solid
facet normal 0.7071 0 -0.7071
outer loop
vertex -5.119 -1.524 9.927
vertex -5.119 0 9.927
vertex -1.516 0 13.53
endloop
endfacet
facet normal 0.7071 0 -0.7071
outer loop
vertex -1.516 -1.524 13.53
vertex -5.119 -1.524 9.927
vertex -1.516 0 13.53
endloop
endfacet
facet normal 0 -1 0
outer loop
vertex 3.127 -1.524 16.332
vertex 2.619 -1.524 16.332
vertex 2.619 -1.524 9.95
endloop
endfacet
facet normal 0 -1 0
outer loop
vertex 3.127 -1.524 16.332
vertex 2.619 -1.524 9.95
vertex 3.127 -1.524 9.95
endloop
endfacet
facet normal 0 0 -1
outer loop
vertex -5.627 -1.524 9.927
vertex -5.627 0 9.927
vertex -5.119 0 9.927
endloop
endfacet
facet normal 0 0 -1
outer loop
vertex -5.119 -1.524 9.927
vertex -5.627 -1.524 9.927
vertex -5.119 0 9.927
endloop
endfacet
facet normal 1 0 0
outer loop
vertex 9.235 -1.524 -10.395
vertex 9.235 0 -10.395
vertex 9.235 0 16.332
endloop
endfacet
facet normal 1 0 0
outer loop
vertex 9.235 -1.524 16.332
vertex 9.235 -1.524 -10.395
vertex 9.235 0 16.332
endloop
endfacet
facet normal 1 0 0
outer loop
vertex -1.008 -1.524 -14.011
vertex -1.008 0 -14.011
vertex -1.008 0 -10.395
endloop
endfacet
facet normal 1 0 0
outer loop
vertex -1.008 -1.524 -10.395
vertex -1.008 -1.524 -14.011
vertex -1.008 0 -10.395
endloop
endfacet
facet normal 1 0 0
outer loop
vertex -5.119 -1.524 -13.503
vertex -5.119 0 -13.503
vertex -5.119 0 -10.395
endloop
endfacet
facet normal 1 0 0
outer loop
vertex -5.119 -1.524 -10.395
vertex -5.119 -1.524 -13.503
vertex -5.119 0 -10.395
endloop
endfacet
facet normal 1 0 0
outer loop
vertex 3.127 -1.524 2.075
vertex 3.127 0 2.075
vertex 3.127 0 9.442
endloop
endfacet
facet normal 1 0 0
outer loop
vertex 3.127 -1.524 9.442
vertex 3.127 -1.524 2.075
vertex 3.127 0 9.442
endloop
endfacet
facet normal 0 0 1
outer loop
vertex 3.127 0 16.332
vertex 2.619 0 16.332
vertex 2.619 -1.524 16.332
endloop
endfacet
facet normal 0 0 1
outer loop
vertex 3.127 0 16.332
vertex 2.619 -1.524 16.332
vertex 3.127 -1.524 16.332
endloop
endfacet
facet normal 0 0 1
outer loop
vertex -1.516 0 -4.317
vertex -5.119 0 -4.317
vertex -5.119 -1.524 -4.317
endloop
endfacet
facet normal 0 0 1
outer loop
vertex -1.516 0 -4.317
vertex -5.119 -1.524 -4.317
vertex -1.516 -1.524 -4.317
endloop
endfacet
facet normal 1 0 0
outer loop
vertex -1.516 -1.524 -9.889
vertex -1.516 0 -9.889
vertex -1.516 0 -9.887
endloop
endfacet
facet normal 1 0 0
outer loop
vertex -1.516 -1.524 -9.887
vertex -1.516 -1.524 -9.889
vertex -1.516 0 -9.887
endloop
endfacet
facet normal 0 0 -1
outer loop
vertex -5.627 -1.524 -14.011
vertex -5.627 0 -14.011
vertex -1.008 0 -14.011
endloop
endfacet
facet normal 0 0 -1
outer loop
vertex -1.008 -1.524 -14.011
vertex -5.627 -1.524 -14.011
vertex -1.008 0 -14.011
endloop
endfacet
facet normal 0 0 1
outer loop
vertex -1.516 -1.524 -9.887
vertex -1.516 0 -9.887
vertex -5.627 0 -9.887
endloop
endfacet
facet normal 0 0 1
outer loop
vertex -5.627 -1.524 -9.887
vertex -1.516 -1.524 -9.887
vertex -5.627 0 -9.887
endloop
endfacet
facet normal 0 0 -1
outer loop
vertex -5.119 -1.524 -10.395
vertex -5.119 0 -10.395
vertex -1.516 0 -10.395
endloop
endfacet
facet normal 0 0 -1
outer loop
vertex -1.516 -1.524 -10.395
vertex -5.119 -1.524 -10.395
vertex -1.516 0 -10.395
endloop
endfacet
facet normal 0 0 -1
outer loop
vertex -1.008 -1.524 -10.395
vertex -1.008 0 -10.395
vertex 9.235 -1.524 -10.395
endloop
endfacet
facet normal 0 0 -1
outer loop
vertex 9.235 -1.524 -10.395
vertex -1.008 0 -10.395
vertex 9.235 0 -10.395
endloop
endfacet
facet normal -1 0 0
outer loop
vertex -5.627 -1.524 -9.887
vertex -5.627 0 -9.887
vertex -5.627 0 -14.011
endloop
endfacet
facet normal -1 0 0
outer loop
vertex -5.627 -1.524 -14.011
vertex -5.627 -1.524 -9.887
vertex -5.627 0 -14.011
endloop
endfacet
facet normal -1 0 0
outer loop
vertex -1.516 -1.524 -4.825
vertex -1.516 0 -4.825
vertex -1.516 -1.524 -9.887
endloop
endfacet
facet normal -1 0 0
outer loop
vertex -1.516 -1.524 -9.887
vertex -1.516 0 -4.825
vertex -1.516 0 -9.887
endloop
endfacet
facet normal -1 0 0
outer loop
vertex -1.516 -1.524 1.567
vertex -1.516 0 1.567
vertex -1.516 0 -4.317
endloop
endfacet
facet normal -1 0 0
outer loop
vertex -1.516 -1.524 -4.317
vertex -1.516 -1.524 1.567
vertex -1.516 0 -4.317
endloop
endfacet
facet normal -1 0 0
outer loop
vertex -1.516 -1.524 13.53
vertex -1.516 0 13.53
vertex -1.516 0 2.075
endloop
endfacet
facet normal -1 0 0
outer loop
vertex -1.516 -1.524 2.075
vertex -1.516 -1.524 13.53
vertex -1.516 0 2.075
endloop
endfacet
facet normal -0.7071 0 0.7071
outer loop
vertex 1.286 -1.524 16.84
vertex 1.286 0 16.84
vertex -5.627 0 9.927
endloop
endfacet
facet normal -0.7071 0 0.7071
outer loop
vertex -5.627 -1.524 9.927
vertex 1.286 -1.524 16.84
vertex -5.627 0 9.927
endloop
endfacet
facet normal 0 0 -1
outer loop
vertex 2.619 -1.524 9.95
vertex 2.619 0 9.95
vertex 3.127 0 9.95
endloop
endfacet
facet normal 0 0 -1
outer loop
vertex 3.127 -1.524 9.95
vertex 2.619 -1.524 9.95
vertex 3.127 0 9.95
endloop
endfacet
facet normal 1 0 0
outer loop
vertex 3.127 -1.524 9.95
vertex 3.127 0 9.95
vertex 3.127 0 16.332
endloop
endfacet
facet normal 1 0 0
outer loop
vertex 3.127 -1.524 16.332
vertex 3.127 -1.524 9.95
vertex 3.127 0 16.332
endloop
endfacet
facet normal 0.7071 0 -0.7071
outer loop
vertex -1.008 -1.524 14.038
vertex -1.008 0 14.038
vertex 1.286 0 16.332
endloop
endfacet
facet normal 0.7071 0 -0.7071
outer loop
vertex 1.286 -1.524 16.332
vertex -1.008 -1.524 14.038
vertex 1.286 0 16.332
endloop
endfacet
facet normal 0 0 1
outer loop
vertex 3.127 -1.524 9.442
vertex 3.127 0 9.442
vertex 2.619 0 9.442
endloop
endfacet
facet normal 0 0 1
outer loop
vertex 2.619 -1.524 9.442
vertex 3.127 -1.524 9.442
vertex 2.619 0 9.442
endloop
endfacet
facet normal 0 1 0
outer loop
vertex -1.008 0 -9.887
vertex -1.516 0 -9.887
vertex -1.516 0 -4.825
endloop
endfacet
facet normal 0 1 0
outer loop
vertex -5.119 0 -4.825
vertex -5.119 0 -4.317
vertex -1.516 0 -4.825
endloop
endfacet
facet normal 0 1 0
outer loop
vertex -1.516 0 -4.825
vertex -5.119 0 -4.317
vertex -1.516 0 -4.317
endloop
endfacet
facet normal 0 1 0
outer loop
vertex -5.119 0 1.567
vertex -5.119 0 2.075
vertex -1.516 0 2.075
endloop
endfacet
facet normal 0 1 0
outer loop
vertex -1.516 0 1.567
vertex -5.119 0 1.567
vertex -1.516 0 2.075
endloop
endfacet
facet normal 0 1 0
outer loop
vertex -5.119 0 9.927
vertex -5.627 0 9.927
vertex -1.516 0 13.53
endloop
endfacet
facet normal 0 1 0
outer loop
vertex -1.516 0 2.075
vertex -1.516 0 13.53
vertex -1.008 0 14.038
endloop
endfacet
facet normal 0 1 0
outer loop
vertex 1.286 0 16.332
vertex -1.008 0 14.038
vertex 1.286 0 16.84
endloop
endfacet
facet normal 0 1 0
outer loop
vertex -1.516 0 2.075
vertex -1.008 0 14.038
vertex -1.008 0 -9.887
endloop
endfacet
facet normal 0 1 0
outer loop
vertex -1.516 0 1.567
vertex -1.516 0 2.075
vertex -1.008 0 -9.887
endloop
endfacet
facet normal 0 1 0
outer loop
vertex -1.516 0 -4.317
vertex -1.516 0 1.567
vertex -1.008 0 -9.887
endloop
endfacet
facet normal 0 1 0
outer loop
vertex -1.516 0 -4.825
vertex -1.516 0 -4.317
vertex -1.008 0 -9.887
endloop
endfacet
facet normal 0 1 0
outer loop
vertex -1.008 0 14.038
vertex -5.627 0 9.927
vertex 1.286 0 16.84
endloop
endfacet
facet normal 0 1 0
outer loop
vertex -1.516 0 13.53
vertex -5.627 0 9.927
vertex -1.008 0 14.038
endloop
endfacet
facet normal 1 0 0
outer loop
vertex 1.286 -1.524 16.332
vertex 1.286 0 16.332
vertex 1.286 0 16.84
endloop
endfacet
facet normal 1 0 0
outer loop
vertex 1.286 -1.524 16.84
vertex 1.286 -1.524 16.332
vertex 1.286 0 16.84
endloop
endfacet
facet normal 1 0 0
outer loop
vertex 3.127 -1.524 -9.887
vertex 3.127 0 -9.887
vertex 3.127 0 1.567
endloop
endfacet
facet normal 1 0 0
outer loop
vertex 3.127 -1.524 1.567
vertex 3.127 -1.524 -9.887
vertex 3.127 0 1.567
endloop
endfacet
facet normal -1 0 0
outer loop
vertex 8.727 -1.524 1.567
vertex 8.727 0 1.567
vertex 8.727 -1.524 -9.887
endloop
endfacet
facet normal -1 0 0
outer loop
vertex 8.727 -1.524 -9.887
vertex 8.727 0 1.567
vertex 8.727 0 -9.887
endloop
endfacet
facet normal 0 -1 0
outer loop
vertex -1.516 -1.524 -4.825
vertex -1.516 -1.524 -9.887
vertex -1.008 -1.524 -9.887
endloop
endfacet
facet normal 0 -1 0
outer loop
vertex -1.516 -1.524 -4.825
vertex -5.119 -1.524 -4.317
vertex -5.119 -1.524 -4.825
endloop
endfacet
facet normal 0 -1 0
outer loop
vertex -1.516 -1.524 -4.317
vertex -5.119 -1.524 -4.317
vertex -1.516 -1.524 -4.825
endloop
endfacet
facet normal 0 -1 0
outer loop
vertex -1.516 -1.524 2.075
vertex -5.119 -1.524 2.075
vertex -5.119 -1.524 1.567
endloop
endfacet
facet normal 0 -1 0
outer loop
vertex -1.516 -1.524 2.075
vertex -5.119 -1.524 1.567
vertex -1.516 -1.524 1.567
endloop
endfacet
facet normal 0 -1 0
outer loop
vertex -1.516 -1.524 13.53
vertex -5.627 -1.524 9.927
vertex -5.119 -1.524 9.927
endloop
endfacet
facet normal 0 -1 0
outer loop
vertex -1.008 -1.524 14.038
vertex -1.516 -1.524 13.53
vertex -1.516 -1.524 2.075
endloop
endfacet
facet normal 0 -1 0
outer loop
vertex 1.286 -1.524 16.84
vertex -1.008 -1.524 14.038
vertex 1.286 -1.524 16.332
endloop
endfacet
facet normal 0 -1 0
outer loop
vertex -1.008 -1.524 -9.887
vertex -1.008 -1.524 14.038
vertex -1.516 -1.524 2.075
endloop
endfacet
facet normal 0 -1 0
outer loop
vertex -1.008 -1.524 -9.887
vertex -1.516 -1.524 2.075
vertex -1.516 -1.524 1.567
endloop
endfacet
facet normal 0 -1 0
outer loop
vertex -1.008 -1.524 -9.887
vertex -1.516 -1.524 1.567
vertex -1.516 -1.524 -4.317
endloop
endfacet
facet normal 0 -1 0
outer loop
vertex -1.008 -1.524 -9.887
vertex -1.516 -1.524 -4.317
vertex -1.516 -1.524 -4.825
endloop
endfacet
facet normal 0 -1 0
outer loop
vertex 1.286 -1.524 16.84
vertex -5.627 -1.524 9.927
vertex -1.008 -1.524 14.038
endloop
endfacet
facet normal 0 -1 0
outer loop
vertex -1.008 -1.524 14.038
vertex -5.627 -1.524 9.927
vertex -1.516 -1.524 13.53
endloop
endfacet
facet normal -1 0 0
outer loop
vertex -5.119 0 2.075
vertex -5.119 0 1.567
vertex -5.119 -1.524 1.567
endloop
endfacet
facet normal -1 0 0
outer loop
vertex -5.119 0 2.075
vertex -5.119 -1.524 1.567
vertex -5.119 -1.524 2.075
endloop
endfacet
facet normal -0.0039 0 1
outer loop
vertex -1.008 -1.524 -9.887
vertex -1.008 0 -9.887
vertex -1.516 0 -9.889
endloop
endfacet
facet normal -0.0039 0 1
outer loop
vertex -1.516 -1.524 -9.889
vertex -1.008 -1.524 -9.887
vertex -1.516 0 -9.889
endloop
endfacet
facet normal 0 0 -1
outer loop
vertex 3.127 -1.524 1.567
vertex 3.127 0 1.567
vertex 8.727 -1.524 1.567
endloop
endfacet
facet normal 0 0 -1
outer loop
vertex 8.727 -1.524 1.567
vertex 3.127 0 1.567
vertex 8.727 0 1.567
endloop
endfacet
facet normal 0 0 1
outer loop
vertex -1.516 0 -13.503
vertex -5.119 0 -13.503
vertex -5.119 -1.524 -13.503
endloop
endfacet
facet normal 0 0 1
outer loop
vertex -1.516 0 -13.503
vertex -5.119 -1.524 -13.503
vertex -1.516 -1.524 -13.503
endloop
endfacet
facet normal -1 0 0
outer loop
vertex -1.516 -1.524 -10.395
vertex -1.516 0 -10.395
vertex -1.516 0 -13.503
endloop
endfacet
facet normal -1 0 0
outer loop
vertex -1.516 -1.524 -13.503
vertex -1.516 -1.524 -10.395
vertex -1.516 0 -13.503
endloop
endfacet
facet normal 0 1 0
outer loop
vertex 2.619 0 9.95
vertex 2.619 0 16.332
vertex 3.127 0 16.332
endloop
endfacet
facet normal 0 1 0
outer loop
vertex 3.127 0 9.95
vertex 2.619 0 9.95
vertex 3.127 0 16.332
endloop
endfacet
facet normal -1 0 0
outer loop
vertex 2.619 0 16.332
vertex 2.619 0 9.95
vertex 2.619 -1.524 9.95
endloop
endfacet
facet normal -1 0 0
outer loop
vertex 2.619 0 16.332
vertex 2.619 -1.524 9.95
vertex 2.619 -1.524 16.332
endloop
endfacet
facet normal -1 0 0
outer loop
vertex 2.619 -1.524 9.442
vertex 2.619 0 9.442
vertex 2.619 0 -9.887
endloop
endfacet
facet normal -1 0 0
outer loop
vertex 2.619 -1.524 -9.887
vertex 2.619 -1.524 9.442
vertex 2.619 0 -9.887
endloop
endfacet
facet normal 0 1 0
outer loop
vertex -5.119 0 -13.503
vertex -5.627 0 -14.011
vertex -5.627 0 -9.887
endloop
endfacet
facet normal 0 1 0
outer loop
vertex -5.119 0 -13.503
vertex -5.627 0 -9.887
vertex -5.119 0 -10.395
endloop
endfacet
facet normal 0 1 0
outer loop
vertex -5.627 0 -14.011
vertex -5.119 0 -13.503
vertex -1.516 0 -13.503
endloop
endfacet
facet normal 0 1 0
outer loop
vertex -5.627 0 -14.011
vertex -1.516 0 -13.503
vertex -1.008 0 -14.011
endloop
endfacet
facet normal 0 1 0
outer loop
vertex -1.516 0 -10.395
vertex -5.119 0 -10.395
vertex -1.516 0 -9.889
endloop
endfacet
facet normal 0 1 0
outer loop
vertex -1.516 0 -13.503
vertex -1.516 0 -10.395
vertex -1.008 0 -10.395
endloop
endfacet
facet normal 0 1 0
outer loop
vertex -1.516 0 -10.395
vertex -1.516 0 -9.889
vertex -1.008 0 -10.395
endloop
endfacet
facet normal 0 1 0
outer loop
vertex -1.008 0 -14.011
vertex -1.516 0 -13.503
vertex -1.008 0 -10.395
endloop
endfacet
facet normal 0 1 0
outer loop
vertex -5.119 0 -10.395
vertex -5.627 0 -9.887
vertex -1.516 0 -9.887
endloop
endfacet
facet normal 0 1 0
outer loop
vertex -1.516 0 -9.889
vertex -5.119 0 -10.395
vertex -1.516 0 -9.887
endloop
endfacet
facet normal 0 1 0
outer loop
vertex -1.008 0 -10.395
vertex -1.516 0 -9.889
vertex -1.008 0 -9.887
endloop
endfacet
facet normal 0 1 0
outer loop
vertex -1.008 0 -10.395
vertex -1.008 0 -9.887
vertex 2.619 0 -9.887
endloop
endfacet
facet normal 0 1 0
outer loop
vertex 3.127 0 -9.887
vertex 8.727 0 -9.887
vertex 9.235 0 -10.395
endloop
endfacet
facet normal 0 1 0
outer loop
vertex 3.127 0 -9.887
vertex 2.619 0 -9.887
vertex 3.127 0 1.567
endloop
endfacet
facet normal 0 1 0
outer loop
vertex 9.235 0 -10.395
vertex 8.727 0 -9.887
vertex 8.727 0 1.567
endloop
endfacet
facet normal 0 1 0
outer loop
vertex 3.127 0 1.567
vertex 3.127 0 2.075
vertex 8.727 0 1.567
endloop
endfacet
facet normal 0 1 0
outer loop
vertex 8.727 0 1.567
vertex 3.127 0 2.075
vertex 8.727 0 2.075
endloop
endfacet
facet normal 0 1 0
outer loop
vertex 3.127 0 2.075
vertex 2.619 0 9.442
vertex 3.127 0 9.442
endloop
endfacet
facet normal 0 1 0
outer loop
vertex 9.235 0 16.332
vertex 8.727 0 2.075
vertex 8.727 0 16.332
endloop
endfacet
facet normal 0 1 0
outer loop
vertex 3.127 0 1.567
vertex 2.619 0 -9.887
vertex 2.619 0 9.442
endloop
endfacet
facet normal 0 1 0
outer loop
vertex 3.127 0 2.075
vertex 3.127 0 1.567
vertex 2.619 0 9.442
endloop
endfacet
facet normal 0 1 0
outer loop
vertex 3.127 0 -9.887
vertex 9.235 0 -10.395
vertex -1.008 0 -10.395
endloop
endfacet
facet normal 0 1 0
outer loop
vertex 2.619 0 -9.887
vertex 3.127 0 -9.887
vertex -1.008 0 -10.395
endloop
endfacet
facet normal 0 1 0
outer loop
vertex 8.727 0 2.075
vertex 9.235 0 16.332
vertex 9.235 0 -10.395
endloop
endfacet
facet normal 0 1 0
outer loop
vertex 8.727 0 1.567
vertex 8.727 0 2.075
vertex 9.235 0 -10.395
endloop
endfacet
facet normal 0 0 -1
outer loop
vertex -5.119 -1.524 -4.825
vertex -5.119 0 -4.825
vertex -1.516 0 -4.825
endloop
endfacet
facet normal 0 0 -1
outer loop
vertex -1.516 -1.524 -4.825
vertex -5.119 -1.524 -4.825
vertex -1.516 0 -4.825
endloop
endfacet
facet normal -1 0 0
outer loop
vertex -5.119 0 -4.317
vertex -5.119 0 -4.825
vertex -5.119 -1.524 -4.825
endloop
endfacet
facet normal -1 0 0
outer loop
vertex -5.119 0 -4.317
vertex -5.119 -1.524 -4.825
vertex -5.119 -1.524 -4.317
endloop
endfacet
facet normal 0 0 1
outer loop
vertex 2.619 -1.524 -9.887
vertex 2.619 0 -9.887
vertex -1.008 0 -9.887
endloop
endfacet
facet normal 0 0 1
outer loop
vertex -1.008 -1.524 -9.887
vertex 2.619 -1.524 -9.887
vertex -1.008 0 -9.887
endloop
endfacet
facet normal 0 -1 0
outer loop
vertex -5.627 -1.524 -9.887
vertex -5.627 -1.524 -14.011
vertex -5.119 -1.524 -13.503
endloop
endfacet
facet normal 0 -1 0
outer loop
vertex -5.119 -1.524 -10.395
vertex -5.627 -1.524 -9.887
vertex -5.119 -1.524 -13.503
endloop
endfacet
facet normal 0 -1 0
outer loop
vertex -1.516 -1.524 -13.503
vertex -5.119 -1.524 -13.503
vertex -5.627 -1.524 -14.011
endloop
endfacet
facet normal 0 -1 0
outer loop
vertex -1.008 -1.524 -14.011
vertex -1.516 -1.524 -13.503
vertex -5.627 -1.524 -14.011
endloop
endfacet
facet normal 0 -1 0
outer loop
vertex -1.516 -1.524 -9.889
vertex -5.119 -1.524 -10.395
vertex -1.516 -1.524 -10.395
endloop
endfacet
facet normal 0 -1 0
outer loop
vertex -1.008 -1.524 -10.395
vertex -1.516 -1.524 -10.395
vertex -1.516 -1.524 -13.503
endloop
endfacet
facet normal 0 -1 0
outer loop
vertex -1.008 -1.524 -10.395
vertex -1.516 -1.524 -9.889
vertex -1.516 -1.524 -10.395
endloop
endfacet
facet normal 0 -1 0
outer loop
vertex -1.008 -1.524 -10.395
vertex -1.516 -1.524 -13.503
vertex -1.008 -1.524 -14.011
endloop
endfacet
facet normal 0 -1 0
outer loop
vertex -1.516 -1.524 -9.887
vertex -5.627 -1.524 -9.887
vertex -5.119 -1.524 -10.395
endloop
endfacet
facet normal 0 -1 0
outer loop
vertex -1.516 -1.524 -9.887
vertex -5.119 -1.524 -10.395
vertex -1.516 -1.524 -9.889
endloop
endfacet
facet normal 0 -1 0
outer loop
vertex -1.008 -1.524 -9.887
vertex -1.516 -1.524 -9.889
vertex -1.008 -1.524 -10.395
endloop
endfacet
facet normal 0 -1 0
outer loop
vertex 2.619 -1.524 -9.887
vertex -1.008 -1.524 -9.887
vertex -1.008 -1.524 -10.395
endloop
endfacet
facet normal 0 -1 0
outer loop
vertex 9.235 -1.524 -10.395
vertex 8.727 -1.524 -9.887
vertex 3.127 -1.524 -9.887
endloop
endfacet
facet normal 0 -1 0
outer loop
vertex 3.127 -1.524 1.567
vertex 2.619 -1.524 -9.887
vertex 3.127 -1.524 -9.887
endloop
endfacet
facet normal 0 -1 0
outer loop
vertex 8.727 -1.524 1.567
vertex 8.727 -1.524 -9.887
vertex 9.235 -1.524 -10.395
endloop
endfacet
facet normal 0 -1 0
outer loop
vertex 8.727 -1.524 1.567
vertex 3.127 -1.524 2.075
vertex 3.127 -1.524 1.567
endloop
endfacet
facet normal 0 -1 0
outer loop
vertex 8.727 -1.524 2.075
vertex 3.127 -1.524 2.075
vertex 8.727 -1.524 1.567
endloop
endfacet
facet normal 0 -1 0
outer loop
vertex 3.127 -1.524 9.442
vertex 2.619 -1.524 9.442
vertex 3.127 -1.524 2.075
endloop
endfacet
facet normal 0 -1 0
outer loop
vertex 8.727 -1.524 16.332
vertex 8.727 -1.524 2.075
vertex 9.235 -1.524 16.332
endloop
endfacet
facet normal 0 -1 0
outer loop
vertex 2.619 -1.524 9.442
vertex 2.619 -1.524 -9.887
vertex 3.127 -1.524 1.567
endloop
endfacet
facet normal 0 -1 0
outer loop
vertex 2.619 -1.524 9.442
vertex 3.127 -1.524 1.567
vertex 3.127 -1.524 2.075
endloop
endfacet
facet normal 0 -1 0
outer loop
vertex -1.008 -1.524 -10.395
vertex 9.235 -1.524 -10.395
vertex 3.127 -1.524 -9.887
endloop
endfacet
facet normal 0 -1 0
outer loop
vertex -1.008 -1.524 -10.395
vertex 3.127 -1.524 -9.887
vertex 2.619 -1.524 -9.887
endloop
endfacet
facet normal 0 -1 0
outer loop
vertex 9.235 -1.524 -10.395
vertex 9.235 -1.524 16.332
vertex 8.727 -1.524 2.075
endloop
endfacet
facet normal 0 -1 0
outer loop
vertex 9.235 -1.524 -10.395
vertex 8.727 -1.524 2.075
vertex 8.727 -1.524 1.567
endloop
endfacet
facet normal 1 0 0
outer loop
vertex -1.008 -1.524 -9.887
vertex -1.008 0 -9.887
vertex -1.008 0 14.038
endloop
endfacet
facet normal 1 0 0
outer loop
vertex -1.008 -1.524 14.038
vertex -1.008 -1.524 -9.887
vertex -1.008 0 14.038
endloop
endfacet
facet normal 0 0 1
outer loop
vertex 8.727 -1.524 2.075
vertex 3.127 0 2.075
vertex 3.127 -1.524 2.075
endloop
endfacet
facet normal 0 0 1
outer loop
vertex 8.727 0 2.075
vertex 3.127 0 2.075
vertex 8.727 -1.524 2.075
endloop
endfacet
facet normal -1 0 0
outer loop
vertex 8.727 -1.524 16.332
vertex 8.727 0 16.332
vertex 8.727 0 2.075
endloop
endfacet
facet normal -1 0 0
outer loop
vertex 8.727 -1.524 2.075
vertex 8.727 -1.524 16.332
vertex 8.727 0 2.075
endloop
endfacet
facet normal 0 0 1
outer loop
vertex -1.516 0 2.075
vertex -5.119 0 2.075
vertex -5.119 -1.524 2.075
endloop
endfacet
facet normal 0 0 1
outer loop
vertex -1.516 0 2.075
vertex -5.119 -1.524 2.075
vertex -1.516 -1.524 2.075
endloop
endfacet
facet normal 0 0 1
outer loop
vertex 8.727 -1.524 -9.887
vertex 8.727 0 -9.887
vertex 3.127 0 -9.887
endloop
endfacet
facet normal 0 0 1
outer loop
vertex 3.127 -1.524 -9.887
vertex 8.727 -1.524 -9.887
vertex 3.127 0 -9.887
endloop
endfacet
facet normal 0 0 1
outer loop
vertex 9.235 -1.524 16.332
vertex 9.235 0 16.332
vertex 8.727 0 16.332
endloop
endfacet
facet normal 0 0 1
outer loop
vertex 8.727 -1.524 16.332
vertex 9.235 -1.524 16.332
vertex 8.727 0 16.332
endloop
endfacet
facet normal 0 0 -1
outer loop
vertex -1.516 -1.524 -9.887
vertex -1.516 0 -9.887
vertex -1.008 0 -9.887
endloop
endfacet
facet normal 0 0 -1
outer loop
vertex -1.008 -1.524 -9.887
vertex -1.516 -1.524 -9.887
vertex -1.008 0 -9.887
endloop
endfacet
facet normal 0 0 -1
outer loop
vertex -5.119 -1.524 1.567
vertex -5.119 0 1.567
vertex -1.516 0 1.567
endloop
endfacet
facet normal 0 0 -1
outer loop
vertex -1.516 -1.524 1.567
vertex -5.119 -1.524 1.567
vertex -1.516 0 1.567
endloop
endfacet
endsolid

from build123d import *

# Parameters (mm, degrees)
F0_W     = 5.5995708565
F0_H     = 0.508
F0_W_2   = 3.602950362
F1_DEPTH = 1.524
F0_W_3   = 0.508
F0_H_2   = 6.3818677289


with BuildPart() as f1:
    # F0 (on Front) → F1 (new body)
    with BuildSketch(Plane.XZ):
        Polygon((8.7267208287, -9.8872872995), (9.2347208287, -9.8872872995), (9.2347208287, 16.3320887597), (8.7267208287, 16.3320887597), (8.7267208287, 9.9502210308), (8.7267208287, 9.4422210308), (8.7267208287, 2.0752214265), (8.7267208287, 1.5672214265), align=None)
        Polygon((9.2347208287, -10.3952872995), (9.2347208287, -9.8872872995), (8.7267208287, -9.8872872995), (3.1271499722, -9.8872872995), (2.6191499722, -9.8872872995), (-1.0082182566, -9.8872872995), (-1.5162182566, -9.8894794907), (-1.5162182566, -9.8872872995), (-5.1191686186, -9.8872872995), (-5.6271686186, -9.8872872995), (-5.6271686186, -10.3952872995), (-5.1191686186, -10.3952872995), (-1.5162182566, -10.3952872995), (-1.0082182566, -10.3952872995), align=None)
        Polygon((2.6191499722, -9.8872872995), (3.1271499722, -9.8872872995), (3.1271499722, 1.5672214265), (3.1271499722, 2.0752214265), (3.1271499722, 9.4422210308), (2.6191499722, 9.4422210308), (2.6191499722, 2.0752214265), (2.6191499722, 1.5672214265), align=None)
        with Locations((5.9269354004, 1.8212214265)):
            Rectangle(F0_W, F0_H)
        with Locations((-3.3176934376, -13.7570005892)):
            Rectangle(F0_W_2, F0_H)
        Polygon((-1.0082182566, -14.0110005892), (-1.0082182566, -10.3952872995), (-1.5162182566, -10.3952872995), (-1.5162182566, -13.5030005892), (-1.5162182566, -14.0110005892), align=None)
        Polygon((-5.1191686186, -13.5030005892), (-5.1191686186, -10.3952872995), (-5.6271686186, -10.3952872995), (-5.6271686186, -14.0110005892), (-5.1191686186, -14.0110005892), align=None)
    extrude(amount=F1_DEPTH)


with BuildPart() as f1b:
    # F0 (on Front) → F1, piece 2 (new body)
    with BuildSketch(Plane.XZ):
        Polygon((-1.5162182566, -9.8872872995), (-1.0082182566, -9.8872872995), (-1.0082182566, 1.5672214265), (-1.0082182566, 2.0752214265), (-1.0082182566, 9.4422210308), (-1.0082182566, 9.9502210308), (-1.0082182566, 14.0377301525), (-1.5162182566, 13.5297301525), (-1.5162182566, 9.9267797906), (-1.5162182566, 9.4187797906), (-1.5162182566, 2.0752214265), (-1.5162182566, 1.5672214265), (-1.5162182566, -4.3169227262), (-1.5162182566, -4.8249227262), align=None)
        with Locations((-3.3176934376, 1.8212214265)):
            Rectangle(F0_W_2, F0_H)
        with Locations((-3.3176934376, -4.5709227262)):
            Rectangle(F0_W_2, F0_H)
        Polygon((1.2861403506, 16.3320887597), (1.2861403506, 16.8400887597), (-5.6271686186, 9.9267797906), (-5.1191686186, 9.9267797906), (-1.5162182566, 13.5297301525), (-1.0082182566, 14.0377301525), align=None)
    extrude(amount=F1_DEPTH)


with BuildPart() as f1c:
    # F0 (on Front) → F1, piece 3 (new body)
    with BuildSketch(Plane.XZ):
        with Locations((2.8731499722, 13.1411548953)):
            Rectangle(F0_W_3, F0_H_2)
    extrude(amount=F1_DEPTH)


solid = Compound([f1.part, f1b.part, f1c.part])
